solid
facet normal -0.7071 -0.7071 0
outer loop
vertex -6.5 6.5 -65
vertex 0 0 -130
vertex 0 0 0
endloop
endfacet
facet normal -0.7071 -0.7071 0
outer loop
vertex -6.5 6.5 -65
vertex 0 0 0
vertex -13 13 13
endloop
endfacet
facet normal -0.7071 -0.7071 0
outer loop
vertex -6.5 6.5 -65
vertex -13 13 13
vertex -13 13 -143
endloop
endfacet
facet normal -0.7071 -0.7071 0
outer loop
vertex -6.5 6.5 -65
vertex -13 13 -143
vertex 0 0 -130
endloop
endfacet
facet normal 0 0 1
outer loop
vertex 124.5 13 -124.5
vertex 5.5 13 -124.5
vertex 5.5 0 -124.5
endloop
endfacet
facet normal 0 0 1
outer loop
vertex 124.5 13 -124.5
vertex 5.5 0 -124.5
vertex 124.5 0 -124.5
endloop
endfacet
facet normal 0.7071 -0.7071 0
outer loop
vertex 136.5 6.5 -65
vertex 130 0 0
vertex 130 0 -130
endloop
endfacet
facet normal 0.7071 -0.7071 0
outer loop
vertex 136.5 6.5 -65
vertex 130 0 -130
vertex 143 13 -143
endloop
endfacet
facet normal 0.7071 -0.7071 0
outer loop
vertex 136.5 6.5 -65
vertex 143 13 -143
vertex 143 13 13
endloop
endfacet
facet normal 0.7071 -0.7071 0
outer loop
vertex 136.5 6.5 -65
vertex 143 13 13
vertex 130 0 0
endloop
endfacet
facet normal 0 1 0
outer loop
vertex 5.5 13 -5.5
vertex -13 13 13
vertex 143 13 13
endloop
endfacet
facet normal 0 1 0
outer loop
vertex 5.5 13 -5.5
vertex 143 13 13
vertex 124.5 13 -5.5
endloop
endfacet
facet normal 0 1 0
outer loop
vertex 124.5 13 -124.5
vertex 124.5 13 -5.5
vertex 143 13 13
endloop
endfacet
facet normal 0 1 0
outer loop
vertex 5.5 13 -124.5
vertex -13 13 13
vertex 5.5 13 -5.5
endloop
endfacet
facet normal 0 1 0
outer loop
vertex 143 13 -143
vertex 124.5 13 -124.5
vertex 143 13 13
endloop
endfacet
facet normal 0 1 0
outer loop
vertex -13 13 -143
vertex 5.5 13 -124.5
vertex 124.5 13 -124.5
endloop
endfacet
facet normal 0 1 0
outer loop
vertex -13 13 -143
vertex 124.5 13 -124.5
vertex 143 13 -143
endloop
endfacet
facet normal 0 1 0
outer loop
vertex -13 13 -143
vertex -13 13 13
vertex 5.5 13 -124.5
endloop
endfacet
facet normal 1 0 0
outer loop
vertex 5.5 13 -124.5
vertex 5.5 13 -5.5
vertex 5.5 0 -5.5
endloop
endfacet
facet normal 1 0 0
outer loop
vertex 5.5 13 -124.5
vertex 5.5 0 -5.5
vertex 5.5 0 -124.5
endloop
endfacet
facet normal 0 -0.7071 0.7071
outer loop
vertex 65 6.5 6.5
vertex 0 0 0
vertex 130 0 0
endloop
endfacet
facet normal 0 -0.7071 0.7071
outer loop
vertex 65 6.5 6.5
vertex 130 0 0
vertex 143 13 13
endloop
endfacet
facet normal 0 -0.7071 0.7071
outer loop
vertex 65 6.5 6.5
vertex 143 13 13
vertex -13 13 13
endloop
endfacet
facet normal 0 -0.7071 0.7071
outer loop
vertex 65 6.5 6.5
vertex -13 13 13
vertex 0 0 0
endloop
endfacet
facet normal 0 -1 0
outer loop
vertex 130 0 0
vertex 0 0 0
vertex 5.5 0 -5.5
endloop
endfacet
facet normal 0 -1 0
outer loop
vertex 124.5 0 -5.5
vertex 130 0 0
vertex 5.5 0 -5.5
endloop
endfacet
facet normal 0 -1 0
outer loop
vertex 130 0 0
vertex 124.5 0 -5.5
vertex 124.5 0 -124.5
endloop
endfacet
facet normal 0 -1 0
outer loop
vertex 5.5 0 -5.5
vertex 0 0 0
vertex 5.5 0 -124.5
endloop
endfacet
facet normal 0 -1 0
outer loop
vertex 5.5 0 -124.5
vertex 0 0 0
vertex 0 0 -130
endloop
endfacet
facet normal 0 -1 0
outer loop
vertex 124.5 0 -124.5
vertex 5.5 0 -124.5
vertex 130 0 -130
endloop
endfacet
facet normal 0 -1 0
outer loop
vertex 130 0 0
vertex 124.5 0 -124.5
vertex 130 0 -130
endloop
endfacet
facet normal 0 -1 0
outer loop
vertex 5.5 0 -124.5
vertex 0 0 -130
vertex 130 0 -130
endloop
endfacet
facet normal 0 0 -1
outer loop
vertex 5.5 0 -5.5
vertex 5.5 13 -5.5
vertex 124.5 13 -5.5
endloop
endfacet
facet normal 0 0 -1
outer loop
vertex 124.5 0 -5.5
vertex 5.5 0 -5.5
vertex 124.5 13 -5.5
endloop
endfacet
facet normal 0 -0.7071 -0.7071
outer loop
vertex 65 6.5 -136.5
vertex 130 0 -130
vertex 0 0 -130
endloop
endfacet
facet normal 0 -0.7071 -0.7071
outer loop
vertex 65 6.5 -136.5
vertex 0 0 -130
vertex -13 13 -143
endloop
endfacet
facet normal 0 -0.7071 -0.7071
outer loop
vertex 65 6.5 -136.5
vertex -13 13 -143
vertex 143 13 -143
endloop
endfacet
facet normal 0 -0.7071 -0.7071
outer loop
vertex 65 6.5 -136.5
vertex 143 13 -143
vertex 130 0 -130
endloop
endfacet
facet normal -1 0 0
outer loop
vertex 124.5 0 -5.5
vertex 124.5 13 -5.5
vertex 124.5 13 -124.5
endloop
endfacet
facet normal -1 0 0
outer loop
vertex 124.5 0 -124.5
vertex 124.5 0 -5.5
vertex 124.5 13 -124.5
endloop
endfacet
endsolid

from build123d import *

# Parameters (mm, degrees)
SKETCH1_W           = 130
SKETCH1_H           = 130
BOSS_EXTRUDE1_DEPTH = 13
BOSS_EXTRUDE1_TAPER = -45
SKETCH2_W           = 119
SKETCH2_H           = 119
CUT_EXTRUDE1_DEPTH  = 13


with BuildPart() as part:
    # Sketch1 → Boss-Extrude1 (new body)
    with BuildSketch(Plane(origin=(0, 0, 0), x_dir=(1, 0, 0), z_dir=(0, 1, 0))):
        with Locations((65, 65)):
            Rectangle(SKETCH1_W, SKETCH1_H)
    extrude(amount=BOSS_EXTRUDE1_DEPTH, taper=BOSS_EXTRUDE1_TAPER)

    # Sketch2 → Cut-Extrude1 (cut)
    with BuildSketch(Plane(origin=(0, 13, 0), x_dir=(1, 0, 0), z_dir=(0, 1, 0))):
        with Locations((65, 65)):
            Rectangle(SKETCH2_W, SKETCH2_H)
    extrude(amount=-CUT_EXTRUDE1_DEPTH, mode=Mode.SUBTRACT)


solid = part.part
